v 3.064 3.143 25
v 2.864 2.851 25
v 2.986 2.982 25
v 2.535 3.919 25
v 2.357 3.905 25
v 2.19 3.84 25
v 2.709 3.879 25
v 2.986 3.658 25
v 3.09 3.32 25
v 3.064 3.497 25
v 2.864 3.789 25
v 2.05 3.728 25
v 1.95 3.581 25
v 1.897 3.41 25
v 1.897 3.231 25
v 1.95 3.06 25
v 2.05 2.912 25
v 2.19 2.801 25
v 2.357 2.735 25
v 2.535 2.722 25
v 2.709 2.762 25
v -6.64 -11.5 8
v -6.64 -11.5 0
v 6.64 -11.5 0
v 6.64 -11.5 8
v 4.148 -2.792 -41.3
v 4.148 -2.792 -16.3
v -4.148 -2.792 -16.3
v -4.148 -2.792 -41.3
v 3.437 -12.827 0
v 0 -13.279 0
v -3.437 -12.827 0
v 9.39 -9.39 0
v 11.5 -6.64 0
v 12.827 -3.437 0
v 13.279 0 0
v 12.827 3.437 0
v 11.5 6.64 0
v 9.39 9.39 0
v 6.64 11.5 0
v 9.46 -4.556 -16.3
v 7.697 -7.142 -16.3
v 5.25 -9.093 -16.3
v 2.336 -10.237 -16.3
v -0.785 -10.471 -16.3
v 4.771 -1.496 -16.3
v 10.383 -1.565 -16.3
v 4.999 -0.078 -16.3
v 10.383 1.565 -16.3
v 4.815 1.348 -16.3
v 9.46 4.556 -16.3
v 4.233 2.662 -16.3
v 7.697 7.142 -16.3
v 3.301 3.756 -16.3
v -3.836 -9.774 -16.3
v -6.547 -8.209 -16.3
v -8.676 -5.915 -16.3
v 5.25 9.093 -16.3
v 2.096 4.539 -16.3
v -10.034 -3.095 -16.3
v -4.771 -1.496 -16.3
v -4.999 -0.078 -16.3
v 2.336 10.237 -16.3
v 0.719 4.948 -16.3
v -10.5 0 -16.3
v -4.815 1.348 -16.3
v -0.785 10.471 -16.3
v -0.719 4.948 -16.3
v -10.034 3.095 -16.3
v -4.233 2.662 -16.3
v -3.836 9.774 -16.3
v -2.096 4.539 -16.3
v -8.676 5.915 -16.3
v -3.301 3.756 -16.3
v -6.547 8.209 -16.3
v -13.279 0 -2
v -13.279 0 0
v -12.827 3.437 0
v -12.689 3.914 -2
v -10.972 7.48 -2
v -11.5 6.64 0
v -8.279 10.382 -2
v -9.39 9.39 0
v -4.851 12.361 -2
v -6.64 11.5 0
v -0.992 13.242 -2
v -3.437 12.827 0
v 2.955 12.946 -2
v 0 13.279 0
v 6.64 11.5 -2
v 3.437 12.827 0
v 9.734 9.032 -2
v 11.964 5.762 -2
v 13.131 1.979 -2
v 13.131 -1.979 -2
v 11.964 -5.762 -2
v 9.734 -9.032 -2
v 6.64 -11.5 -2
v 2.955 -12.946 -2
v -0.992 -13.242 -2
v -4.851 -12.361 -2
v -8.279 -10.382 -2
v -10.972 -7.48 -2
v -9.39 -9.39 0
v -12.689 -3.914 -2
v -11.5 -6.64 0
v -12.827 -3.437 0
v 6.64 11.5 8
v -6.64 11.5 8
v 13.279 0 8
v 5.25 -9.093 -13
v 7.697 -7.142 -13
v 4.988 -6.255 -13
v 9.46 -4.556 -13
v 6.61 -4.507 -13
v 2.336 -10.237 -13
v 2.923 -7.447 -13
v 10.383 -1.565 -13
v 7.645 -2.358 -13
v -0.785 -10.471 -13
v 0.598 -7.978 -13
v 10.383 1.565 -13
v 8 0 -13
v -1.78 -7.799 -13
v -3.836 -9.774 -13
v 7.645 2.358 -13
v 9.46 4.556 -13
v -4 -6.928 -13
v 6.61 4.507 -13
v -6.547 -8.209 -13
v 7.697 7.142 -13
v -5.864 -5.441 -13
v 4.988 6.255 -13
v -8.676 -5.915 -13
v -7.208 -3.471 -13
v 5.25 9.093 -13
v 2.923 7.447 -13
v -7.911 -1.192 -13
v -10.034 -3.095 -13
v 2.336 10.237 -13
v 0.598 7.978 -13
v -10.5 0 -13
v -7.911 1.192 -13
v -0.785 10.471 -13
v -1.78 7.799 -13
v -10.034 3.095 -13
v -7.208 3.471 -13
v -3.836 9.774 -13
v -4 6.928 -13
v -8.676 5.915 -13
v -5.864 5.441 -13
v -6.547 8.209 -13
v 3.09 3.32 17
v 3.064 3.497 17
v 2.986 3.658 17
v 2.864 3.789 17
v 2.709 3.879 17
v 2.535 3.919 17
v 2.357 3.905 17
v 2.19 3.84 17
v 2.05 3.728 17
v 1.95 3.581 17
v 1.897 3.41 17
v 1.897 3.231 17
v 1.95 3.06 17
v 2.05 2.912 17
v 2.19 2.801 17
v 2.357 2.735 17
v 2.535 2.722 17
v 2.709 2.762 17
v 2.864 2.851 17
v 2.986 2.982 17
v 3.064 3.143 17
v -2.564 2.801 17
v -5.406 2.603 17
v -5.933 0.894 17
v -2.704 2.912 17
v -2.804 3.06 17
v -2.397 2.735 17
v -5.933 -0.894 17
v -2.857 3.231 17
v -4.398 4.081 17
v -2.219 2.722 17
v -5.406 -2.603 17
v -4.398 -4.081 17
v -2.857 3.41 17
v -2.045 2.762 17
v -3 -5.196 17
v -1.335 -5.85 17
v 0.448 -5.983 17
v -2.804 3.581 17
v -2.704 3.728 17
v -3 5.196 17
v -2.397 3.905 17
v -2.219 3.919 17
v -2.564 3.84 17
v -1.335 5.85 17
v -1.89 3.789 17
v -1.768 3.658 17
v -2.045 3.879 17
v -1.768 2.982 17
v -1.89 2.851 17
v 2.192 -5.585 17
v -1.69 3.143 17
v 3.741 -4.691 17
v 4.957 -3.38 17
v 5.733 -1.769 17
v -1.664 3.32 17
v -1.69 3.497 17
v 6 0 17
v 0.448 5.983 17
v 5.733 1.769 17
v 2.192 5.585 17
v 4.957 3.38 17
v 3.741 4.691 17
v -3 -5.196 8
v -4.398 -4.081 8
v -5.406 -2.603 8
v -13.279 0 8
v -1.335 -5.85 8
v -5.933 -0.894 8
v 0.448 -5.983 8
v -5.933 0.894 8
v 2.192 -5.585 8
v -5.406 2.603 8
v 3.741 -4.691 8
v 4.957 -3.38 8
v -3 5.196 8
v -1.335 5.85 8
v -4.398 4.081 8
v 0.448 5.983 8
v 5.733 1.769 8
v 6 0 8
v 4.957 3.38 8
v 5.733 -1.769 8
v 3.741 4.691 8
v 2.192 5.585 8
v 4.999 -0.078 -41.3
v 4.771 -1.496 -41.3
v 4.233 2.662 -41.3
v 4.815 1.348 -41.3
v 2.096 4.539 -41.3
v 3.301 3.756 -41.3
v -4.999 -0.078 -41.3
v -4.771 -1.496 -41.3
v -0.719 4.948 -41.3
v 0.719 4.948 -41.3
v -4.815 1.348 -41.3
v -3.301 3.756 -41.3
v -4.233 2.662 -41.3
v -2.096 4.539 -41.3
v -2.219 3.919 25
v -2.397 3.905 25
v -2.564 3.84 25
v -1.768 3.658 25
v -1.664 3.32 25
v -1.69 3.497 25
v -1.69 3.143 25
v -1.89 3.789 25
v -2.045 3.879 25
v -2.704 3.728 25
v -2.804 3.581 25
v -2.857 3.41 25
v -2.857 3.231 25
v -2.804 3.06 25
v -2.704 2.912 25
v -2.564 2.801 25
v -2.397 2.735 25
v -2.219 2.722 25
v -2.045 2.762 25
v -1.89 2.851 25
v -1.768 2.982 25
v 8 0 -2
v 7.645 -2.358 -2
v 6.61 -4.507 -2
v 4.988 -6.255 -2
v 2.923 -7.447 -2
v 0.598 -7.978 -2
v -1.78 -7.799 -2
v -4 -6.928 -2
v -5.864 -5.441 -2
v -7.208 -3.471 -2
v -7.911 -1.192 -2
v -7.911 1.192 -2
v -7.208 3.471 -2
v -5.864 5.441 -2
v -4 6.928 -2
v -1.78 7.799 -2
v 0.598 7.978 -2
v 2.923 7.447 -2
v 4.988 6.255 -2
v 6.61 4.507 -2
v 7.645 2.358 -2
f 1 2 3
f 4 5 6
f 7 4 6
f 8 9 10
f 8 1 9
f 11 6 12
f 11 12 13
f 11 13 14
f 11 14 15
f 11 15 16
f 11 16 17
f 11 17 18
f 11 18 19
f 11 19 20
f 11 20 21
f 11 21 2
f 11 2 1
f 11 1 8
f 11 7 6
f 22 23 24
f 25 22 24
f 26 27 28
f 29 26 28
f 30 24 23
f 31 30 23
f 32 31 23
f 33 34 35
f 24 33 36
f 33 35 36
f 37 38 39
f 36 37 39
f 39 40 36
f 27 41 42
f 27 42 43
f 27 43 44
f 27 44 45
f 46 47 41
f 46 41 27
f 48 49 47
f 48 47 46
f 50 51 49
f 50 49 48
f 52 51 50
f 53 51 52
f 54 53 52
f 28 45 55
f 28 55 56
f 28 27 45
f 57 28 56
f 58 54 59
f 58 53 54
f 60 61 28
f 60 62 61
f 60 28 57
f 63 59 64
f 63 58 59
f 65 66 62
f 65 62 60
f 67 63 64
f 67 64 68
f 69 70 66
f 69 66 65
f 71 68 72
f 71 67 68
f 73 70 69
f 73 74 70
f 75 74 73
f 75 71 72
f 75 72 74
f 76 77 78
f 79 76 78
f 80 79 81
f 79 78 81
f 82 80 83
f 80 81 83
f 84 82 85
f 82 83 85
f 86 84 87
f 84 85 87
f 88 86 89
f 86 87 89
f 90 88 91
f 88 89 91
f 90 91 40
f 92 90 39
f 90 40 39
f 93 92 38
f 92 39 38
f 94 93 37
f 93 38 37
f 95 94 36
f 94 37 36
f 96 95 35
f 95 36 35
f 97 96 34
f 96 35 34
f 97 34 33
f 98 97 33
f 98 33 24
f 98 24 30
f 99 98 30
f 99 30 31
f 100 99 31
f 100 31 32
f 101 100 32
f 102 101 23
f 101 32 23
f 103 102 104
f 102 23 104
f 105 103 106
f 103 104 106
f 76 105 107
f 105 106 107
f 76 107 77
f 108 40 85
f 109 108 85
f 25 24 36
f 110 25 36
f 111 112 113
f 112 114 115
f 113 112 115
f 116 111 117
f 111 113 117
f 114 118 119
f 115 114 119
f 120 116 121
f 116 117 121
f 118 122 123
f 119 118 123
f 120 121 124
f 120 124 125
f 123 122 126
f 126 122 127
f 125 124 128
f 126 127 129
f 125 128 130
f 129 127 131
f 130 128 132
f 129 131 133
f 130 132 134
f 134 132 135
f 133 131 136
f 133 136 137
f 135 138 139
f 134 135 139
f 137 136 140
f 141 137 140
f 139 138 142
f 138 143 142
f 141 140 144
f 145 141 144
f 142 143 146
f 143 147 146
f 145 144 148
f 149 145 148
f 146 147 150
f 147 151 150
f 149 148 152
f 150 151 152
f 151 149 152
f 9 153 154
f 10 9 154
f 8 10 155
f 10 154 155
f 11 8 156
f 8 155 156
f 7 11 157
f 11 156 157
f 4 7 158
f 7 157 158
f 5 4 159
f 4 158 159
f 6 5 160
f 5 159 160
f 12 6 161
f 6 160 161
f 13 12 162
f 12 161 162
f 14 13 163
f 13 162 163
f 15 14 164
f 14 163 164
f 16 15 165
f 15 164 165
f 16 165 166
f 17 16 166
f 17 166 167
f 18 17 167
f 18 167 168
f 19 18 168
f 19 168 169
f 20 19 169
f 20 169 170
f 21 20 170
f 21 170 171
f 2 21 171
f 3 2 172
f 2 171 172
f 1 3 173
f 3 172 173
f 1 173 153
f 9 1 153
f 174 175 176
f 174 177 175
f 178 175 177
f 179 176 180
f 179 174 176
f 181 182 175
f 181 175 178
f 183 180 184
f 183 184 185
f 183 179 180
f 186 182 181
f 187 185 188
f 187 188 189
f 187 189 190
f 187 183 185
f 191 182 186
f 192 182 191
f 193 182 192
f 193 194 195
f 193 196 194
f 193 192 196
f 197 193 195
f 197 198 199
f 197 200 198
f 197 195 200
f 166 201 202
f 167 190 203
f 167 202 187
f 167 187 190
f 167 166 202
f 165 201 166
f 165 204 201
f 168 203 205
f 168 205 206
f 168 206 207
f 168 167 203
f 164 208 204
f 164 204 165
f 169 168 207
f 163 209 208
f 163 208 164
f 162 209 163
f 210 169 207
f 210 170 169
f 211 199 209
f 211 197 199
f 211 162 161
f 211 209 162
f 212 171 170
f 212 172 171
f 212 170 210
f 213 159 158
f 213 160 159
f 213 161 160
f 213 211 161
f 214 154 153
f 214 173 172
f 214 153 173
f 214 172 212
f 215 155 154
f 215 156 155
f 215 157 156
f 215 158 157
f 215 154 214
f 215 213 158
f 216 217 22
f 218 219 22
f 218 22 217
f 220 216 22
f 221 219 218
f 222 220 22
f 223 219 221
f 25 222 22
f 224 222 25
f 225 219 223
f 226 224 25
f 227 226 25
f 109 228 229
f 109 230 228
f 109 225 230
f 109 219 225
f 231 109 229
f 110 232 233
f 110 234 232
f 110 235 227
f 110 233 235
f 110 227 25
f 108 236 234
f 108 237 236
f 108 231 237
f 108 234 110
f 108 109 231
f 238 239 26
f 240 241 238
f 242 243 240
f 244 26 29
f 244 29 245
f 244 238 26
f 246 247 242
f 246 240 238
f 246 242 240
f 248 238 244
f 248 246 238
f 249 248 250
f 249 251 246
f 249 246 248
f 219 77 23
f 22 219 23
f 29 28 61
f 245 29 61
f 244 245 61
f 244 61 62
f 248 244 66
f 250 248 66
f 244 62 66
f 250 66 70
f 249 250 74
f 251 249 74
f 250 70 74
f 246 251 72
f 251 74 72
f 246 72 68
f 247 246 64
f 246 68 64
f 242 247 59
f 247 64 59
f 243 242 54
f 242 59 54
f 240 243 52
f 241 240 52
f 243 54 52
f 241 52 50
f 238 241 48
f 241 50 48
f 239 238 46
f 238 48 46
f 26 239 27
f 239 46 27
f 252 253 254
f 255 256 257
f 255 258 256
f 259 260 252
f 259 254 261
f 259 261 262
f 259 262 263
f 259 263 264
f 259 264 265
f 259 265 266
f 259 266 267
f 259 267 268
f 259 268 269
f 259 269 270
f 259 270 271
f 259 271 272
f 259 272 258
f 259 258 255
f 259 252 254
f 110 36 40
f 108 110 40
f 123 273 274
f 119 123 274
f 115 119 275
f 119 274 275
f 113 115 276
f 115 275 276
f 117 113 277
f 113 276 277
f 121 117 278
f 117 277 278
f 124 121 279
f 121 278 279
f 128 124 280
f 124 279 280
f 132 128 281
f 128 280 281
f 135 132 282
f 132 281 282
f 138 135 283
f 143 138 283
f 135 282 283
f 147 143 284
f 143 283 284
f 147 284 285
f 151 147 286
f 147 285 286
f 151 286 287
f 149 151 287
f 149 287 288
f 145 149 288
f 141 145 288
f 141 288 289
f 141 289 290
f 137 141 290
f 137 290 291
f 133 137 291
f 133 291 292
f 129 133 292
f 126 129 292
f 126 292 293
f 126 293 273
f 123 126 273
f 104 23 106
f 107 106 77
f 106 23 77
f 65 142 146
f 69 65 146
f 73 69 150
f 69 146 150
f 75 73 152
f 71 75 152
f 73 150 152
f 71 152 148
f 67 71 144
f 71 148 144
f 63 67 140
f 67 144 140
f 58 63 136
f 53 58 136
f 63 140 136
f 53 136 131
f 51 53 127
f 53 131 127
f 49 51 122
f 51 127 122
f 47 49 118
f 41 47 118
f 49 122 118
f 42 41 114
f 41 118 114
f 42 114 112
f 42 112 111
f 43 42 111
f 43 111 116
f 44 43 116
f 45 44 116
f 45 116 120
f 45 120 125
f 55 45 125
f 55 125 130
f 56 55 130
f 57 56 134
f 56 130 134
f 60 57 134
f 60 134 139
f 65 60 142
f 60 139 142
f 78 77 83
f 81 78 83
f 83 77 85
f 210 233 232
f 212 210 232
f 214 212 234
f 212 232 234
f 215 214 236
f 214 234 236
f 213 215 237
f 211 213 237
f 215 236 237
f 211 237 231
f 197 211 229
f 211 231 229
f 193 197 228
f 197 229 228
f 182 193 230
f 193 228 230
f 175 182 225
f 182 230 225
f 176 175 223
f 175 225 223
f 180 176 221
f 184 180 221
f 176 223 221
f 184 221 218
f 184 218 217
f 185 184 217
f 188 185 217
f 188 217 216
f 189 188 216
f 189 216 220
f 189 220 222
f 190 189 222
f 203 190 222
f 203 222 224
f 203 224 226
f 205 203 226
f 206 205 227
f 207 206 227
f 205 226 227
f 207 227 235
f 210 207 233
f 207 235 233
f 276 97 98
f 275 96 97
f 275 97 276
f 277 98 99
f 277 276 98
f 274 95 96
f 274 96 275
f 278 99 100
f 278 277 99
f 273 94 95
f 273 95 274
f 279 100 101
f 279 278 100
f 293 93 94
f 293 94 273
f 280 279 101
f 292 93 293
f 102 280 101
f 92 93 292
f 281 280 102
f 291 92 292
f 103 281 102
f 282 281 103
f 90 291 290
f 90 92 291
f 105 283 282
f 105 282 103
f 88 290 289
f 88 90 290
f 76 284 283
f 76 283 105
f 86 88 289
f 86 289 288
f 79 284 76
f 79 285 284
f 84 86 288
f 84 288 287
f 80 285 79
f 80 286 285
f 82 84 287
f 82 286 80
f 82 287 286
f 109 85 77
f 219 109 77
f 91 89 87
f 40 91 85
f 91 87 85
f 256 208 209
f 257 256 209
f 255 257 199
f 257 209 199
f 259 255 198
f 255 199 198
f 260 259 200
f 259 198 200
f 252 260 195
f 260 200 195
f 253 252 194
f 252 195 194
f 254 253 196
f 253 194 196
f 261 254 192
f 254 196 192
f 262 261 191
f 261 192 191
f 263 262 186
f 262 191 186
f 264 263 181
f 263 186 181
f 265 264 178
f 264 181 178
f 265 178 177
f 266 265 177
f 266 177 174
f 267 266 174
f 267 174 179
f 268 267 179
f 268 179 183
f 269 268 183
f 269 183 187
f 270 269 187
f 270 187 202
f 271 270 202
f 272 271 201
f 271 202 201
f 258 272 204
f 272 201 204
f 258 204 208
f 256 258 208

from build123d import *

# Parameters (mm, degrees)
RESSALTO_EXTRUS_O1_DEPTH = 8
ESBO_O2_R                = 6
RESSALTO_EXTRUS_O2_DEPTH = 9
ESBO_O3_R                = 8
RESSALTO_EXTRUS_O3_DEPTH = 13
ESBO_O4_R                = 10.5
RESSALTO_EXTRUS_O4_DEPTH = 3.3
RESSALTO_EXTRUS_O6_DEPTH = 25
ESBO_O6_R                = 13.279056191
RESSALTO_EXTRUS_O7_DEPTH = 2
ESBO_O7_R                = 0.6
RESSALTO_EXTRUS_O8_DEPTH = 8


with BuildPart() as part:
    # Esboço1 → Ressalto-extrusão1 (new body)
    with BuildSketch(Plane.XY):
        Polygon((6.639528096, -11.5), (13.279056191, 0), (6.639528096, 11.5), (-6.639528096, 11.5), (-13.279056191, 0), (-6.639528096, -11.5), align=None)
    extrude(amount=RESSALTO_EXTRUS_O1_DEPTH)

    # Esboço2 → Ressalto-extrusão2 (add)
    with BuildSketch(Plane.XY.offset(8)):
        Circle(ESBO_O2_R)
    extrude(amount=RESSALTO_EXTRUS_O2_DEPTH)

    # Esboço3 → Ressalto-extrusão3 (add)
    with BuildSketch(Plane(origin=(0, 0, 0), x_dir=(-1, 0, 0), z_dir=(0, 0, -1))):
        with Locations(Location((0, 0, 0), (0, 0, 180))):
            Circle(ESBO_O3_R)
    extrude(amount=RESSALTO_EXTRUS_O3_DEPTH)

    # Esboço4 → Ressalto-extrusão4 (add)
    with BuildSketch(Plane(origin=(0, 0, -13), x_dir=(-1, 0, 0), z_dir=(0, 0, -1))):
        Circle(ESBO_O4_R)
    extrude(amount=RESSALTO_EXTRUS_O4_DEPTH)

    # Esboço5 → Ressalto-extrusão6 (add)
    with BuildSketch(Plane(origin=(0, 0, -16.3), x_dir=(-1, 0, 0), z_dir=(0, 0, -1))):
        with BuildLine():
            Line((-4.148096191, -2.791647899), (4.148096191, -2.791647899))
            ThreePointArc((4.148096191, -2.791647899), (0, 5), (-4.148096191, -2.791647899))
        make_face()
    extrude(amount=RESSALTO_EXTRUS_O6_DEPTH)

    # Esboço6 → Ressalto-extrusão7 (add)
    with BuildSketch(Plane(origin=(0, 0, 0), x_dir=(-1, 0, 0), z_dir=(0, 0, -1))):
        Circle(ESBO_O6_R)
    extrude(amount=RESSALTO_EXTRUS_O7_DEPTH)

    # Esboço7 → Ressalto-extrusão8 (add)
    with BuildSketch(Plane.XY.offset(17)):
        with Locations((-2.263806511, 3.320249549)):
            Circle(ESBO_O7_R)
        with Locations((2.490187162, 3.320249549)):
            Circle(ESBO_O7_R)
    extrude(amount=RESSALTO_EXTRUS_O8_DEPTH)


solid = part.part
